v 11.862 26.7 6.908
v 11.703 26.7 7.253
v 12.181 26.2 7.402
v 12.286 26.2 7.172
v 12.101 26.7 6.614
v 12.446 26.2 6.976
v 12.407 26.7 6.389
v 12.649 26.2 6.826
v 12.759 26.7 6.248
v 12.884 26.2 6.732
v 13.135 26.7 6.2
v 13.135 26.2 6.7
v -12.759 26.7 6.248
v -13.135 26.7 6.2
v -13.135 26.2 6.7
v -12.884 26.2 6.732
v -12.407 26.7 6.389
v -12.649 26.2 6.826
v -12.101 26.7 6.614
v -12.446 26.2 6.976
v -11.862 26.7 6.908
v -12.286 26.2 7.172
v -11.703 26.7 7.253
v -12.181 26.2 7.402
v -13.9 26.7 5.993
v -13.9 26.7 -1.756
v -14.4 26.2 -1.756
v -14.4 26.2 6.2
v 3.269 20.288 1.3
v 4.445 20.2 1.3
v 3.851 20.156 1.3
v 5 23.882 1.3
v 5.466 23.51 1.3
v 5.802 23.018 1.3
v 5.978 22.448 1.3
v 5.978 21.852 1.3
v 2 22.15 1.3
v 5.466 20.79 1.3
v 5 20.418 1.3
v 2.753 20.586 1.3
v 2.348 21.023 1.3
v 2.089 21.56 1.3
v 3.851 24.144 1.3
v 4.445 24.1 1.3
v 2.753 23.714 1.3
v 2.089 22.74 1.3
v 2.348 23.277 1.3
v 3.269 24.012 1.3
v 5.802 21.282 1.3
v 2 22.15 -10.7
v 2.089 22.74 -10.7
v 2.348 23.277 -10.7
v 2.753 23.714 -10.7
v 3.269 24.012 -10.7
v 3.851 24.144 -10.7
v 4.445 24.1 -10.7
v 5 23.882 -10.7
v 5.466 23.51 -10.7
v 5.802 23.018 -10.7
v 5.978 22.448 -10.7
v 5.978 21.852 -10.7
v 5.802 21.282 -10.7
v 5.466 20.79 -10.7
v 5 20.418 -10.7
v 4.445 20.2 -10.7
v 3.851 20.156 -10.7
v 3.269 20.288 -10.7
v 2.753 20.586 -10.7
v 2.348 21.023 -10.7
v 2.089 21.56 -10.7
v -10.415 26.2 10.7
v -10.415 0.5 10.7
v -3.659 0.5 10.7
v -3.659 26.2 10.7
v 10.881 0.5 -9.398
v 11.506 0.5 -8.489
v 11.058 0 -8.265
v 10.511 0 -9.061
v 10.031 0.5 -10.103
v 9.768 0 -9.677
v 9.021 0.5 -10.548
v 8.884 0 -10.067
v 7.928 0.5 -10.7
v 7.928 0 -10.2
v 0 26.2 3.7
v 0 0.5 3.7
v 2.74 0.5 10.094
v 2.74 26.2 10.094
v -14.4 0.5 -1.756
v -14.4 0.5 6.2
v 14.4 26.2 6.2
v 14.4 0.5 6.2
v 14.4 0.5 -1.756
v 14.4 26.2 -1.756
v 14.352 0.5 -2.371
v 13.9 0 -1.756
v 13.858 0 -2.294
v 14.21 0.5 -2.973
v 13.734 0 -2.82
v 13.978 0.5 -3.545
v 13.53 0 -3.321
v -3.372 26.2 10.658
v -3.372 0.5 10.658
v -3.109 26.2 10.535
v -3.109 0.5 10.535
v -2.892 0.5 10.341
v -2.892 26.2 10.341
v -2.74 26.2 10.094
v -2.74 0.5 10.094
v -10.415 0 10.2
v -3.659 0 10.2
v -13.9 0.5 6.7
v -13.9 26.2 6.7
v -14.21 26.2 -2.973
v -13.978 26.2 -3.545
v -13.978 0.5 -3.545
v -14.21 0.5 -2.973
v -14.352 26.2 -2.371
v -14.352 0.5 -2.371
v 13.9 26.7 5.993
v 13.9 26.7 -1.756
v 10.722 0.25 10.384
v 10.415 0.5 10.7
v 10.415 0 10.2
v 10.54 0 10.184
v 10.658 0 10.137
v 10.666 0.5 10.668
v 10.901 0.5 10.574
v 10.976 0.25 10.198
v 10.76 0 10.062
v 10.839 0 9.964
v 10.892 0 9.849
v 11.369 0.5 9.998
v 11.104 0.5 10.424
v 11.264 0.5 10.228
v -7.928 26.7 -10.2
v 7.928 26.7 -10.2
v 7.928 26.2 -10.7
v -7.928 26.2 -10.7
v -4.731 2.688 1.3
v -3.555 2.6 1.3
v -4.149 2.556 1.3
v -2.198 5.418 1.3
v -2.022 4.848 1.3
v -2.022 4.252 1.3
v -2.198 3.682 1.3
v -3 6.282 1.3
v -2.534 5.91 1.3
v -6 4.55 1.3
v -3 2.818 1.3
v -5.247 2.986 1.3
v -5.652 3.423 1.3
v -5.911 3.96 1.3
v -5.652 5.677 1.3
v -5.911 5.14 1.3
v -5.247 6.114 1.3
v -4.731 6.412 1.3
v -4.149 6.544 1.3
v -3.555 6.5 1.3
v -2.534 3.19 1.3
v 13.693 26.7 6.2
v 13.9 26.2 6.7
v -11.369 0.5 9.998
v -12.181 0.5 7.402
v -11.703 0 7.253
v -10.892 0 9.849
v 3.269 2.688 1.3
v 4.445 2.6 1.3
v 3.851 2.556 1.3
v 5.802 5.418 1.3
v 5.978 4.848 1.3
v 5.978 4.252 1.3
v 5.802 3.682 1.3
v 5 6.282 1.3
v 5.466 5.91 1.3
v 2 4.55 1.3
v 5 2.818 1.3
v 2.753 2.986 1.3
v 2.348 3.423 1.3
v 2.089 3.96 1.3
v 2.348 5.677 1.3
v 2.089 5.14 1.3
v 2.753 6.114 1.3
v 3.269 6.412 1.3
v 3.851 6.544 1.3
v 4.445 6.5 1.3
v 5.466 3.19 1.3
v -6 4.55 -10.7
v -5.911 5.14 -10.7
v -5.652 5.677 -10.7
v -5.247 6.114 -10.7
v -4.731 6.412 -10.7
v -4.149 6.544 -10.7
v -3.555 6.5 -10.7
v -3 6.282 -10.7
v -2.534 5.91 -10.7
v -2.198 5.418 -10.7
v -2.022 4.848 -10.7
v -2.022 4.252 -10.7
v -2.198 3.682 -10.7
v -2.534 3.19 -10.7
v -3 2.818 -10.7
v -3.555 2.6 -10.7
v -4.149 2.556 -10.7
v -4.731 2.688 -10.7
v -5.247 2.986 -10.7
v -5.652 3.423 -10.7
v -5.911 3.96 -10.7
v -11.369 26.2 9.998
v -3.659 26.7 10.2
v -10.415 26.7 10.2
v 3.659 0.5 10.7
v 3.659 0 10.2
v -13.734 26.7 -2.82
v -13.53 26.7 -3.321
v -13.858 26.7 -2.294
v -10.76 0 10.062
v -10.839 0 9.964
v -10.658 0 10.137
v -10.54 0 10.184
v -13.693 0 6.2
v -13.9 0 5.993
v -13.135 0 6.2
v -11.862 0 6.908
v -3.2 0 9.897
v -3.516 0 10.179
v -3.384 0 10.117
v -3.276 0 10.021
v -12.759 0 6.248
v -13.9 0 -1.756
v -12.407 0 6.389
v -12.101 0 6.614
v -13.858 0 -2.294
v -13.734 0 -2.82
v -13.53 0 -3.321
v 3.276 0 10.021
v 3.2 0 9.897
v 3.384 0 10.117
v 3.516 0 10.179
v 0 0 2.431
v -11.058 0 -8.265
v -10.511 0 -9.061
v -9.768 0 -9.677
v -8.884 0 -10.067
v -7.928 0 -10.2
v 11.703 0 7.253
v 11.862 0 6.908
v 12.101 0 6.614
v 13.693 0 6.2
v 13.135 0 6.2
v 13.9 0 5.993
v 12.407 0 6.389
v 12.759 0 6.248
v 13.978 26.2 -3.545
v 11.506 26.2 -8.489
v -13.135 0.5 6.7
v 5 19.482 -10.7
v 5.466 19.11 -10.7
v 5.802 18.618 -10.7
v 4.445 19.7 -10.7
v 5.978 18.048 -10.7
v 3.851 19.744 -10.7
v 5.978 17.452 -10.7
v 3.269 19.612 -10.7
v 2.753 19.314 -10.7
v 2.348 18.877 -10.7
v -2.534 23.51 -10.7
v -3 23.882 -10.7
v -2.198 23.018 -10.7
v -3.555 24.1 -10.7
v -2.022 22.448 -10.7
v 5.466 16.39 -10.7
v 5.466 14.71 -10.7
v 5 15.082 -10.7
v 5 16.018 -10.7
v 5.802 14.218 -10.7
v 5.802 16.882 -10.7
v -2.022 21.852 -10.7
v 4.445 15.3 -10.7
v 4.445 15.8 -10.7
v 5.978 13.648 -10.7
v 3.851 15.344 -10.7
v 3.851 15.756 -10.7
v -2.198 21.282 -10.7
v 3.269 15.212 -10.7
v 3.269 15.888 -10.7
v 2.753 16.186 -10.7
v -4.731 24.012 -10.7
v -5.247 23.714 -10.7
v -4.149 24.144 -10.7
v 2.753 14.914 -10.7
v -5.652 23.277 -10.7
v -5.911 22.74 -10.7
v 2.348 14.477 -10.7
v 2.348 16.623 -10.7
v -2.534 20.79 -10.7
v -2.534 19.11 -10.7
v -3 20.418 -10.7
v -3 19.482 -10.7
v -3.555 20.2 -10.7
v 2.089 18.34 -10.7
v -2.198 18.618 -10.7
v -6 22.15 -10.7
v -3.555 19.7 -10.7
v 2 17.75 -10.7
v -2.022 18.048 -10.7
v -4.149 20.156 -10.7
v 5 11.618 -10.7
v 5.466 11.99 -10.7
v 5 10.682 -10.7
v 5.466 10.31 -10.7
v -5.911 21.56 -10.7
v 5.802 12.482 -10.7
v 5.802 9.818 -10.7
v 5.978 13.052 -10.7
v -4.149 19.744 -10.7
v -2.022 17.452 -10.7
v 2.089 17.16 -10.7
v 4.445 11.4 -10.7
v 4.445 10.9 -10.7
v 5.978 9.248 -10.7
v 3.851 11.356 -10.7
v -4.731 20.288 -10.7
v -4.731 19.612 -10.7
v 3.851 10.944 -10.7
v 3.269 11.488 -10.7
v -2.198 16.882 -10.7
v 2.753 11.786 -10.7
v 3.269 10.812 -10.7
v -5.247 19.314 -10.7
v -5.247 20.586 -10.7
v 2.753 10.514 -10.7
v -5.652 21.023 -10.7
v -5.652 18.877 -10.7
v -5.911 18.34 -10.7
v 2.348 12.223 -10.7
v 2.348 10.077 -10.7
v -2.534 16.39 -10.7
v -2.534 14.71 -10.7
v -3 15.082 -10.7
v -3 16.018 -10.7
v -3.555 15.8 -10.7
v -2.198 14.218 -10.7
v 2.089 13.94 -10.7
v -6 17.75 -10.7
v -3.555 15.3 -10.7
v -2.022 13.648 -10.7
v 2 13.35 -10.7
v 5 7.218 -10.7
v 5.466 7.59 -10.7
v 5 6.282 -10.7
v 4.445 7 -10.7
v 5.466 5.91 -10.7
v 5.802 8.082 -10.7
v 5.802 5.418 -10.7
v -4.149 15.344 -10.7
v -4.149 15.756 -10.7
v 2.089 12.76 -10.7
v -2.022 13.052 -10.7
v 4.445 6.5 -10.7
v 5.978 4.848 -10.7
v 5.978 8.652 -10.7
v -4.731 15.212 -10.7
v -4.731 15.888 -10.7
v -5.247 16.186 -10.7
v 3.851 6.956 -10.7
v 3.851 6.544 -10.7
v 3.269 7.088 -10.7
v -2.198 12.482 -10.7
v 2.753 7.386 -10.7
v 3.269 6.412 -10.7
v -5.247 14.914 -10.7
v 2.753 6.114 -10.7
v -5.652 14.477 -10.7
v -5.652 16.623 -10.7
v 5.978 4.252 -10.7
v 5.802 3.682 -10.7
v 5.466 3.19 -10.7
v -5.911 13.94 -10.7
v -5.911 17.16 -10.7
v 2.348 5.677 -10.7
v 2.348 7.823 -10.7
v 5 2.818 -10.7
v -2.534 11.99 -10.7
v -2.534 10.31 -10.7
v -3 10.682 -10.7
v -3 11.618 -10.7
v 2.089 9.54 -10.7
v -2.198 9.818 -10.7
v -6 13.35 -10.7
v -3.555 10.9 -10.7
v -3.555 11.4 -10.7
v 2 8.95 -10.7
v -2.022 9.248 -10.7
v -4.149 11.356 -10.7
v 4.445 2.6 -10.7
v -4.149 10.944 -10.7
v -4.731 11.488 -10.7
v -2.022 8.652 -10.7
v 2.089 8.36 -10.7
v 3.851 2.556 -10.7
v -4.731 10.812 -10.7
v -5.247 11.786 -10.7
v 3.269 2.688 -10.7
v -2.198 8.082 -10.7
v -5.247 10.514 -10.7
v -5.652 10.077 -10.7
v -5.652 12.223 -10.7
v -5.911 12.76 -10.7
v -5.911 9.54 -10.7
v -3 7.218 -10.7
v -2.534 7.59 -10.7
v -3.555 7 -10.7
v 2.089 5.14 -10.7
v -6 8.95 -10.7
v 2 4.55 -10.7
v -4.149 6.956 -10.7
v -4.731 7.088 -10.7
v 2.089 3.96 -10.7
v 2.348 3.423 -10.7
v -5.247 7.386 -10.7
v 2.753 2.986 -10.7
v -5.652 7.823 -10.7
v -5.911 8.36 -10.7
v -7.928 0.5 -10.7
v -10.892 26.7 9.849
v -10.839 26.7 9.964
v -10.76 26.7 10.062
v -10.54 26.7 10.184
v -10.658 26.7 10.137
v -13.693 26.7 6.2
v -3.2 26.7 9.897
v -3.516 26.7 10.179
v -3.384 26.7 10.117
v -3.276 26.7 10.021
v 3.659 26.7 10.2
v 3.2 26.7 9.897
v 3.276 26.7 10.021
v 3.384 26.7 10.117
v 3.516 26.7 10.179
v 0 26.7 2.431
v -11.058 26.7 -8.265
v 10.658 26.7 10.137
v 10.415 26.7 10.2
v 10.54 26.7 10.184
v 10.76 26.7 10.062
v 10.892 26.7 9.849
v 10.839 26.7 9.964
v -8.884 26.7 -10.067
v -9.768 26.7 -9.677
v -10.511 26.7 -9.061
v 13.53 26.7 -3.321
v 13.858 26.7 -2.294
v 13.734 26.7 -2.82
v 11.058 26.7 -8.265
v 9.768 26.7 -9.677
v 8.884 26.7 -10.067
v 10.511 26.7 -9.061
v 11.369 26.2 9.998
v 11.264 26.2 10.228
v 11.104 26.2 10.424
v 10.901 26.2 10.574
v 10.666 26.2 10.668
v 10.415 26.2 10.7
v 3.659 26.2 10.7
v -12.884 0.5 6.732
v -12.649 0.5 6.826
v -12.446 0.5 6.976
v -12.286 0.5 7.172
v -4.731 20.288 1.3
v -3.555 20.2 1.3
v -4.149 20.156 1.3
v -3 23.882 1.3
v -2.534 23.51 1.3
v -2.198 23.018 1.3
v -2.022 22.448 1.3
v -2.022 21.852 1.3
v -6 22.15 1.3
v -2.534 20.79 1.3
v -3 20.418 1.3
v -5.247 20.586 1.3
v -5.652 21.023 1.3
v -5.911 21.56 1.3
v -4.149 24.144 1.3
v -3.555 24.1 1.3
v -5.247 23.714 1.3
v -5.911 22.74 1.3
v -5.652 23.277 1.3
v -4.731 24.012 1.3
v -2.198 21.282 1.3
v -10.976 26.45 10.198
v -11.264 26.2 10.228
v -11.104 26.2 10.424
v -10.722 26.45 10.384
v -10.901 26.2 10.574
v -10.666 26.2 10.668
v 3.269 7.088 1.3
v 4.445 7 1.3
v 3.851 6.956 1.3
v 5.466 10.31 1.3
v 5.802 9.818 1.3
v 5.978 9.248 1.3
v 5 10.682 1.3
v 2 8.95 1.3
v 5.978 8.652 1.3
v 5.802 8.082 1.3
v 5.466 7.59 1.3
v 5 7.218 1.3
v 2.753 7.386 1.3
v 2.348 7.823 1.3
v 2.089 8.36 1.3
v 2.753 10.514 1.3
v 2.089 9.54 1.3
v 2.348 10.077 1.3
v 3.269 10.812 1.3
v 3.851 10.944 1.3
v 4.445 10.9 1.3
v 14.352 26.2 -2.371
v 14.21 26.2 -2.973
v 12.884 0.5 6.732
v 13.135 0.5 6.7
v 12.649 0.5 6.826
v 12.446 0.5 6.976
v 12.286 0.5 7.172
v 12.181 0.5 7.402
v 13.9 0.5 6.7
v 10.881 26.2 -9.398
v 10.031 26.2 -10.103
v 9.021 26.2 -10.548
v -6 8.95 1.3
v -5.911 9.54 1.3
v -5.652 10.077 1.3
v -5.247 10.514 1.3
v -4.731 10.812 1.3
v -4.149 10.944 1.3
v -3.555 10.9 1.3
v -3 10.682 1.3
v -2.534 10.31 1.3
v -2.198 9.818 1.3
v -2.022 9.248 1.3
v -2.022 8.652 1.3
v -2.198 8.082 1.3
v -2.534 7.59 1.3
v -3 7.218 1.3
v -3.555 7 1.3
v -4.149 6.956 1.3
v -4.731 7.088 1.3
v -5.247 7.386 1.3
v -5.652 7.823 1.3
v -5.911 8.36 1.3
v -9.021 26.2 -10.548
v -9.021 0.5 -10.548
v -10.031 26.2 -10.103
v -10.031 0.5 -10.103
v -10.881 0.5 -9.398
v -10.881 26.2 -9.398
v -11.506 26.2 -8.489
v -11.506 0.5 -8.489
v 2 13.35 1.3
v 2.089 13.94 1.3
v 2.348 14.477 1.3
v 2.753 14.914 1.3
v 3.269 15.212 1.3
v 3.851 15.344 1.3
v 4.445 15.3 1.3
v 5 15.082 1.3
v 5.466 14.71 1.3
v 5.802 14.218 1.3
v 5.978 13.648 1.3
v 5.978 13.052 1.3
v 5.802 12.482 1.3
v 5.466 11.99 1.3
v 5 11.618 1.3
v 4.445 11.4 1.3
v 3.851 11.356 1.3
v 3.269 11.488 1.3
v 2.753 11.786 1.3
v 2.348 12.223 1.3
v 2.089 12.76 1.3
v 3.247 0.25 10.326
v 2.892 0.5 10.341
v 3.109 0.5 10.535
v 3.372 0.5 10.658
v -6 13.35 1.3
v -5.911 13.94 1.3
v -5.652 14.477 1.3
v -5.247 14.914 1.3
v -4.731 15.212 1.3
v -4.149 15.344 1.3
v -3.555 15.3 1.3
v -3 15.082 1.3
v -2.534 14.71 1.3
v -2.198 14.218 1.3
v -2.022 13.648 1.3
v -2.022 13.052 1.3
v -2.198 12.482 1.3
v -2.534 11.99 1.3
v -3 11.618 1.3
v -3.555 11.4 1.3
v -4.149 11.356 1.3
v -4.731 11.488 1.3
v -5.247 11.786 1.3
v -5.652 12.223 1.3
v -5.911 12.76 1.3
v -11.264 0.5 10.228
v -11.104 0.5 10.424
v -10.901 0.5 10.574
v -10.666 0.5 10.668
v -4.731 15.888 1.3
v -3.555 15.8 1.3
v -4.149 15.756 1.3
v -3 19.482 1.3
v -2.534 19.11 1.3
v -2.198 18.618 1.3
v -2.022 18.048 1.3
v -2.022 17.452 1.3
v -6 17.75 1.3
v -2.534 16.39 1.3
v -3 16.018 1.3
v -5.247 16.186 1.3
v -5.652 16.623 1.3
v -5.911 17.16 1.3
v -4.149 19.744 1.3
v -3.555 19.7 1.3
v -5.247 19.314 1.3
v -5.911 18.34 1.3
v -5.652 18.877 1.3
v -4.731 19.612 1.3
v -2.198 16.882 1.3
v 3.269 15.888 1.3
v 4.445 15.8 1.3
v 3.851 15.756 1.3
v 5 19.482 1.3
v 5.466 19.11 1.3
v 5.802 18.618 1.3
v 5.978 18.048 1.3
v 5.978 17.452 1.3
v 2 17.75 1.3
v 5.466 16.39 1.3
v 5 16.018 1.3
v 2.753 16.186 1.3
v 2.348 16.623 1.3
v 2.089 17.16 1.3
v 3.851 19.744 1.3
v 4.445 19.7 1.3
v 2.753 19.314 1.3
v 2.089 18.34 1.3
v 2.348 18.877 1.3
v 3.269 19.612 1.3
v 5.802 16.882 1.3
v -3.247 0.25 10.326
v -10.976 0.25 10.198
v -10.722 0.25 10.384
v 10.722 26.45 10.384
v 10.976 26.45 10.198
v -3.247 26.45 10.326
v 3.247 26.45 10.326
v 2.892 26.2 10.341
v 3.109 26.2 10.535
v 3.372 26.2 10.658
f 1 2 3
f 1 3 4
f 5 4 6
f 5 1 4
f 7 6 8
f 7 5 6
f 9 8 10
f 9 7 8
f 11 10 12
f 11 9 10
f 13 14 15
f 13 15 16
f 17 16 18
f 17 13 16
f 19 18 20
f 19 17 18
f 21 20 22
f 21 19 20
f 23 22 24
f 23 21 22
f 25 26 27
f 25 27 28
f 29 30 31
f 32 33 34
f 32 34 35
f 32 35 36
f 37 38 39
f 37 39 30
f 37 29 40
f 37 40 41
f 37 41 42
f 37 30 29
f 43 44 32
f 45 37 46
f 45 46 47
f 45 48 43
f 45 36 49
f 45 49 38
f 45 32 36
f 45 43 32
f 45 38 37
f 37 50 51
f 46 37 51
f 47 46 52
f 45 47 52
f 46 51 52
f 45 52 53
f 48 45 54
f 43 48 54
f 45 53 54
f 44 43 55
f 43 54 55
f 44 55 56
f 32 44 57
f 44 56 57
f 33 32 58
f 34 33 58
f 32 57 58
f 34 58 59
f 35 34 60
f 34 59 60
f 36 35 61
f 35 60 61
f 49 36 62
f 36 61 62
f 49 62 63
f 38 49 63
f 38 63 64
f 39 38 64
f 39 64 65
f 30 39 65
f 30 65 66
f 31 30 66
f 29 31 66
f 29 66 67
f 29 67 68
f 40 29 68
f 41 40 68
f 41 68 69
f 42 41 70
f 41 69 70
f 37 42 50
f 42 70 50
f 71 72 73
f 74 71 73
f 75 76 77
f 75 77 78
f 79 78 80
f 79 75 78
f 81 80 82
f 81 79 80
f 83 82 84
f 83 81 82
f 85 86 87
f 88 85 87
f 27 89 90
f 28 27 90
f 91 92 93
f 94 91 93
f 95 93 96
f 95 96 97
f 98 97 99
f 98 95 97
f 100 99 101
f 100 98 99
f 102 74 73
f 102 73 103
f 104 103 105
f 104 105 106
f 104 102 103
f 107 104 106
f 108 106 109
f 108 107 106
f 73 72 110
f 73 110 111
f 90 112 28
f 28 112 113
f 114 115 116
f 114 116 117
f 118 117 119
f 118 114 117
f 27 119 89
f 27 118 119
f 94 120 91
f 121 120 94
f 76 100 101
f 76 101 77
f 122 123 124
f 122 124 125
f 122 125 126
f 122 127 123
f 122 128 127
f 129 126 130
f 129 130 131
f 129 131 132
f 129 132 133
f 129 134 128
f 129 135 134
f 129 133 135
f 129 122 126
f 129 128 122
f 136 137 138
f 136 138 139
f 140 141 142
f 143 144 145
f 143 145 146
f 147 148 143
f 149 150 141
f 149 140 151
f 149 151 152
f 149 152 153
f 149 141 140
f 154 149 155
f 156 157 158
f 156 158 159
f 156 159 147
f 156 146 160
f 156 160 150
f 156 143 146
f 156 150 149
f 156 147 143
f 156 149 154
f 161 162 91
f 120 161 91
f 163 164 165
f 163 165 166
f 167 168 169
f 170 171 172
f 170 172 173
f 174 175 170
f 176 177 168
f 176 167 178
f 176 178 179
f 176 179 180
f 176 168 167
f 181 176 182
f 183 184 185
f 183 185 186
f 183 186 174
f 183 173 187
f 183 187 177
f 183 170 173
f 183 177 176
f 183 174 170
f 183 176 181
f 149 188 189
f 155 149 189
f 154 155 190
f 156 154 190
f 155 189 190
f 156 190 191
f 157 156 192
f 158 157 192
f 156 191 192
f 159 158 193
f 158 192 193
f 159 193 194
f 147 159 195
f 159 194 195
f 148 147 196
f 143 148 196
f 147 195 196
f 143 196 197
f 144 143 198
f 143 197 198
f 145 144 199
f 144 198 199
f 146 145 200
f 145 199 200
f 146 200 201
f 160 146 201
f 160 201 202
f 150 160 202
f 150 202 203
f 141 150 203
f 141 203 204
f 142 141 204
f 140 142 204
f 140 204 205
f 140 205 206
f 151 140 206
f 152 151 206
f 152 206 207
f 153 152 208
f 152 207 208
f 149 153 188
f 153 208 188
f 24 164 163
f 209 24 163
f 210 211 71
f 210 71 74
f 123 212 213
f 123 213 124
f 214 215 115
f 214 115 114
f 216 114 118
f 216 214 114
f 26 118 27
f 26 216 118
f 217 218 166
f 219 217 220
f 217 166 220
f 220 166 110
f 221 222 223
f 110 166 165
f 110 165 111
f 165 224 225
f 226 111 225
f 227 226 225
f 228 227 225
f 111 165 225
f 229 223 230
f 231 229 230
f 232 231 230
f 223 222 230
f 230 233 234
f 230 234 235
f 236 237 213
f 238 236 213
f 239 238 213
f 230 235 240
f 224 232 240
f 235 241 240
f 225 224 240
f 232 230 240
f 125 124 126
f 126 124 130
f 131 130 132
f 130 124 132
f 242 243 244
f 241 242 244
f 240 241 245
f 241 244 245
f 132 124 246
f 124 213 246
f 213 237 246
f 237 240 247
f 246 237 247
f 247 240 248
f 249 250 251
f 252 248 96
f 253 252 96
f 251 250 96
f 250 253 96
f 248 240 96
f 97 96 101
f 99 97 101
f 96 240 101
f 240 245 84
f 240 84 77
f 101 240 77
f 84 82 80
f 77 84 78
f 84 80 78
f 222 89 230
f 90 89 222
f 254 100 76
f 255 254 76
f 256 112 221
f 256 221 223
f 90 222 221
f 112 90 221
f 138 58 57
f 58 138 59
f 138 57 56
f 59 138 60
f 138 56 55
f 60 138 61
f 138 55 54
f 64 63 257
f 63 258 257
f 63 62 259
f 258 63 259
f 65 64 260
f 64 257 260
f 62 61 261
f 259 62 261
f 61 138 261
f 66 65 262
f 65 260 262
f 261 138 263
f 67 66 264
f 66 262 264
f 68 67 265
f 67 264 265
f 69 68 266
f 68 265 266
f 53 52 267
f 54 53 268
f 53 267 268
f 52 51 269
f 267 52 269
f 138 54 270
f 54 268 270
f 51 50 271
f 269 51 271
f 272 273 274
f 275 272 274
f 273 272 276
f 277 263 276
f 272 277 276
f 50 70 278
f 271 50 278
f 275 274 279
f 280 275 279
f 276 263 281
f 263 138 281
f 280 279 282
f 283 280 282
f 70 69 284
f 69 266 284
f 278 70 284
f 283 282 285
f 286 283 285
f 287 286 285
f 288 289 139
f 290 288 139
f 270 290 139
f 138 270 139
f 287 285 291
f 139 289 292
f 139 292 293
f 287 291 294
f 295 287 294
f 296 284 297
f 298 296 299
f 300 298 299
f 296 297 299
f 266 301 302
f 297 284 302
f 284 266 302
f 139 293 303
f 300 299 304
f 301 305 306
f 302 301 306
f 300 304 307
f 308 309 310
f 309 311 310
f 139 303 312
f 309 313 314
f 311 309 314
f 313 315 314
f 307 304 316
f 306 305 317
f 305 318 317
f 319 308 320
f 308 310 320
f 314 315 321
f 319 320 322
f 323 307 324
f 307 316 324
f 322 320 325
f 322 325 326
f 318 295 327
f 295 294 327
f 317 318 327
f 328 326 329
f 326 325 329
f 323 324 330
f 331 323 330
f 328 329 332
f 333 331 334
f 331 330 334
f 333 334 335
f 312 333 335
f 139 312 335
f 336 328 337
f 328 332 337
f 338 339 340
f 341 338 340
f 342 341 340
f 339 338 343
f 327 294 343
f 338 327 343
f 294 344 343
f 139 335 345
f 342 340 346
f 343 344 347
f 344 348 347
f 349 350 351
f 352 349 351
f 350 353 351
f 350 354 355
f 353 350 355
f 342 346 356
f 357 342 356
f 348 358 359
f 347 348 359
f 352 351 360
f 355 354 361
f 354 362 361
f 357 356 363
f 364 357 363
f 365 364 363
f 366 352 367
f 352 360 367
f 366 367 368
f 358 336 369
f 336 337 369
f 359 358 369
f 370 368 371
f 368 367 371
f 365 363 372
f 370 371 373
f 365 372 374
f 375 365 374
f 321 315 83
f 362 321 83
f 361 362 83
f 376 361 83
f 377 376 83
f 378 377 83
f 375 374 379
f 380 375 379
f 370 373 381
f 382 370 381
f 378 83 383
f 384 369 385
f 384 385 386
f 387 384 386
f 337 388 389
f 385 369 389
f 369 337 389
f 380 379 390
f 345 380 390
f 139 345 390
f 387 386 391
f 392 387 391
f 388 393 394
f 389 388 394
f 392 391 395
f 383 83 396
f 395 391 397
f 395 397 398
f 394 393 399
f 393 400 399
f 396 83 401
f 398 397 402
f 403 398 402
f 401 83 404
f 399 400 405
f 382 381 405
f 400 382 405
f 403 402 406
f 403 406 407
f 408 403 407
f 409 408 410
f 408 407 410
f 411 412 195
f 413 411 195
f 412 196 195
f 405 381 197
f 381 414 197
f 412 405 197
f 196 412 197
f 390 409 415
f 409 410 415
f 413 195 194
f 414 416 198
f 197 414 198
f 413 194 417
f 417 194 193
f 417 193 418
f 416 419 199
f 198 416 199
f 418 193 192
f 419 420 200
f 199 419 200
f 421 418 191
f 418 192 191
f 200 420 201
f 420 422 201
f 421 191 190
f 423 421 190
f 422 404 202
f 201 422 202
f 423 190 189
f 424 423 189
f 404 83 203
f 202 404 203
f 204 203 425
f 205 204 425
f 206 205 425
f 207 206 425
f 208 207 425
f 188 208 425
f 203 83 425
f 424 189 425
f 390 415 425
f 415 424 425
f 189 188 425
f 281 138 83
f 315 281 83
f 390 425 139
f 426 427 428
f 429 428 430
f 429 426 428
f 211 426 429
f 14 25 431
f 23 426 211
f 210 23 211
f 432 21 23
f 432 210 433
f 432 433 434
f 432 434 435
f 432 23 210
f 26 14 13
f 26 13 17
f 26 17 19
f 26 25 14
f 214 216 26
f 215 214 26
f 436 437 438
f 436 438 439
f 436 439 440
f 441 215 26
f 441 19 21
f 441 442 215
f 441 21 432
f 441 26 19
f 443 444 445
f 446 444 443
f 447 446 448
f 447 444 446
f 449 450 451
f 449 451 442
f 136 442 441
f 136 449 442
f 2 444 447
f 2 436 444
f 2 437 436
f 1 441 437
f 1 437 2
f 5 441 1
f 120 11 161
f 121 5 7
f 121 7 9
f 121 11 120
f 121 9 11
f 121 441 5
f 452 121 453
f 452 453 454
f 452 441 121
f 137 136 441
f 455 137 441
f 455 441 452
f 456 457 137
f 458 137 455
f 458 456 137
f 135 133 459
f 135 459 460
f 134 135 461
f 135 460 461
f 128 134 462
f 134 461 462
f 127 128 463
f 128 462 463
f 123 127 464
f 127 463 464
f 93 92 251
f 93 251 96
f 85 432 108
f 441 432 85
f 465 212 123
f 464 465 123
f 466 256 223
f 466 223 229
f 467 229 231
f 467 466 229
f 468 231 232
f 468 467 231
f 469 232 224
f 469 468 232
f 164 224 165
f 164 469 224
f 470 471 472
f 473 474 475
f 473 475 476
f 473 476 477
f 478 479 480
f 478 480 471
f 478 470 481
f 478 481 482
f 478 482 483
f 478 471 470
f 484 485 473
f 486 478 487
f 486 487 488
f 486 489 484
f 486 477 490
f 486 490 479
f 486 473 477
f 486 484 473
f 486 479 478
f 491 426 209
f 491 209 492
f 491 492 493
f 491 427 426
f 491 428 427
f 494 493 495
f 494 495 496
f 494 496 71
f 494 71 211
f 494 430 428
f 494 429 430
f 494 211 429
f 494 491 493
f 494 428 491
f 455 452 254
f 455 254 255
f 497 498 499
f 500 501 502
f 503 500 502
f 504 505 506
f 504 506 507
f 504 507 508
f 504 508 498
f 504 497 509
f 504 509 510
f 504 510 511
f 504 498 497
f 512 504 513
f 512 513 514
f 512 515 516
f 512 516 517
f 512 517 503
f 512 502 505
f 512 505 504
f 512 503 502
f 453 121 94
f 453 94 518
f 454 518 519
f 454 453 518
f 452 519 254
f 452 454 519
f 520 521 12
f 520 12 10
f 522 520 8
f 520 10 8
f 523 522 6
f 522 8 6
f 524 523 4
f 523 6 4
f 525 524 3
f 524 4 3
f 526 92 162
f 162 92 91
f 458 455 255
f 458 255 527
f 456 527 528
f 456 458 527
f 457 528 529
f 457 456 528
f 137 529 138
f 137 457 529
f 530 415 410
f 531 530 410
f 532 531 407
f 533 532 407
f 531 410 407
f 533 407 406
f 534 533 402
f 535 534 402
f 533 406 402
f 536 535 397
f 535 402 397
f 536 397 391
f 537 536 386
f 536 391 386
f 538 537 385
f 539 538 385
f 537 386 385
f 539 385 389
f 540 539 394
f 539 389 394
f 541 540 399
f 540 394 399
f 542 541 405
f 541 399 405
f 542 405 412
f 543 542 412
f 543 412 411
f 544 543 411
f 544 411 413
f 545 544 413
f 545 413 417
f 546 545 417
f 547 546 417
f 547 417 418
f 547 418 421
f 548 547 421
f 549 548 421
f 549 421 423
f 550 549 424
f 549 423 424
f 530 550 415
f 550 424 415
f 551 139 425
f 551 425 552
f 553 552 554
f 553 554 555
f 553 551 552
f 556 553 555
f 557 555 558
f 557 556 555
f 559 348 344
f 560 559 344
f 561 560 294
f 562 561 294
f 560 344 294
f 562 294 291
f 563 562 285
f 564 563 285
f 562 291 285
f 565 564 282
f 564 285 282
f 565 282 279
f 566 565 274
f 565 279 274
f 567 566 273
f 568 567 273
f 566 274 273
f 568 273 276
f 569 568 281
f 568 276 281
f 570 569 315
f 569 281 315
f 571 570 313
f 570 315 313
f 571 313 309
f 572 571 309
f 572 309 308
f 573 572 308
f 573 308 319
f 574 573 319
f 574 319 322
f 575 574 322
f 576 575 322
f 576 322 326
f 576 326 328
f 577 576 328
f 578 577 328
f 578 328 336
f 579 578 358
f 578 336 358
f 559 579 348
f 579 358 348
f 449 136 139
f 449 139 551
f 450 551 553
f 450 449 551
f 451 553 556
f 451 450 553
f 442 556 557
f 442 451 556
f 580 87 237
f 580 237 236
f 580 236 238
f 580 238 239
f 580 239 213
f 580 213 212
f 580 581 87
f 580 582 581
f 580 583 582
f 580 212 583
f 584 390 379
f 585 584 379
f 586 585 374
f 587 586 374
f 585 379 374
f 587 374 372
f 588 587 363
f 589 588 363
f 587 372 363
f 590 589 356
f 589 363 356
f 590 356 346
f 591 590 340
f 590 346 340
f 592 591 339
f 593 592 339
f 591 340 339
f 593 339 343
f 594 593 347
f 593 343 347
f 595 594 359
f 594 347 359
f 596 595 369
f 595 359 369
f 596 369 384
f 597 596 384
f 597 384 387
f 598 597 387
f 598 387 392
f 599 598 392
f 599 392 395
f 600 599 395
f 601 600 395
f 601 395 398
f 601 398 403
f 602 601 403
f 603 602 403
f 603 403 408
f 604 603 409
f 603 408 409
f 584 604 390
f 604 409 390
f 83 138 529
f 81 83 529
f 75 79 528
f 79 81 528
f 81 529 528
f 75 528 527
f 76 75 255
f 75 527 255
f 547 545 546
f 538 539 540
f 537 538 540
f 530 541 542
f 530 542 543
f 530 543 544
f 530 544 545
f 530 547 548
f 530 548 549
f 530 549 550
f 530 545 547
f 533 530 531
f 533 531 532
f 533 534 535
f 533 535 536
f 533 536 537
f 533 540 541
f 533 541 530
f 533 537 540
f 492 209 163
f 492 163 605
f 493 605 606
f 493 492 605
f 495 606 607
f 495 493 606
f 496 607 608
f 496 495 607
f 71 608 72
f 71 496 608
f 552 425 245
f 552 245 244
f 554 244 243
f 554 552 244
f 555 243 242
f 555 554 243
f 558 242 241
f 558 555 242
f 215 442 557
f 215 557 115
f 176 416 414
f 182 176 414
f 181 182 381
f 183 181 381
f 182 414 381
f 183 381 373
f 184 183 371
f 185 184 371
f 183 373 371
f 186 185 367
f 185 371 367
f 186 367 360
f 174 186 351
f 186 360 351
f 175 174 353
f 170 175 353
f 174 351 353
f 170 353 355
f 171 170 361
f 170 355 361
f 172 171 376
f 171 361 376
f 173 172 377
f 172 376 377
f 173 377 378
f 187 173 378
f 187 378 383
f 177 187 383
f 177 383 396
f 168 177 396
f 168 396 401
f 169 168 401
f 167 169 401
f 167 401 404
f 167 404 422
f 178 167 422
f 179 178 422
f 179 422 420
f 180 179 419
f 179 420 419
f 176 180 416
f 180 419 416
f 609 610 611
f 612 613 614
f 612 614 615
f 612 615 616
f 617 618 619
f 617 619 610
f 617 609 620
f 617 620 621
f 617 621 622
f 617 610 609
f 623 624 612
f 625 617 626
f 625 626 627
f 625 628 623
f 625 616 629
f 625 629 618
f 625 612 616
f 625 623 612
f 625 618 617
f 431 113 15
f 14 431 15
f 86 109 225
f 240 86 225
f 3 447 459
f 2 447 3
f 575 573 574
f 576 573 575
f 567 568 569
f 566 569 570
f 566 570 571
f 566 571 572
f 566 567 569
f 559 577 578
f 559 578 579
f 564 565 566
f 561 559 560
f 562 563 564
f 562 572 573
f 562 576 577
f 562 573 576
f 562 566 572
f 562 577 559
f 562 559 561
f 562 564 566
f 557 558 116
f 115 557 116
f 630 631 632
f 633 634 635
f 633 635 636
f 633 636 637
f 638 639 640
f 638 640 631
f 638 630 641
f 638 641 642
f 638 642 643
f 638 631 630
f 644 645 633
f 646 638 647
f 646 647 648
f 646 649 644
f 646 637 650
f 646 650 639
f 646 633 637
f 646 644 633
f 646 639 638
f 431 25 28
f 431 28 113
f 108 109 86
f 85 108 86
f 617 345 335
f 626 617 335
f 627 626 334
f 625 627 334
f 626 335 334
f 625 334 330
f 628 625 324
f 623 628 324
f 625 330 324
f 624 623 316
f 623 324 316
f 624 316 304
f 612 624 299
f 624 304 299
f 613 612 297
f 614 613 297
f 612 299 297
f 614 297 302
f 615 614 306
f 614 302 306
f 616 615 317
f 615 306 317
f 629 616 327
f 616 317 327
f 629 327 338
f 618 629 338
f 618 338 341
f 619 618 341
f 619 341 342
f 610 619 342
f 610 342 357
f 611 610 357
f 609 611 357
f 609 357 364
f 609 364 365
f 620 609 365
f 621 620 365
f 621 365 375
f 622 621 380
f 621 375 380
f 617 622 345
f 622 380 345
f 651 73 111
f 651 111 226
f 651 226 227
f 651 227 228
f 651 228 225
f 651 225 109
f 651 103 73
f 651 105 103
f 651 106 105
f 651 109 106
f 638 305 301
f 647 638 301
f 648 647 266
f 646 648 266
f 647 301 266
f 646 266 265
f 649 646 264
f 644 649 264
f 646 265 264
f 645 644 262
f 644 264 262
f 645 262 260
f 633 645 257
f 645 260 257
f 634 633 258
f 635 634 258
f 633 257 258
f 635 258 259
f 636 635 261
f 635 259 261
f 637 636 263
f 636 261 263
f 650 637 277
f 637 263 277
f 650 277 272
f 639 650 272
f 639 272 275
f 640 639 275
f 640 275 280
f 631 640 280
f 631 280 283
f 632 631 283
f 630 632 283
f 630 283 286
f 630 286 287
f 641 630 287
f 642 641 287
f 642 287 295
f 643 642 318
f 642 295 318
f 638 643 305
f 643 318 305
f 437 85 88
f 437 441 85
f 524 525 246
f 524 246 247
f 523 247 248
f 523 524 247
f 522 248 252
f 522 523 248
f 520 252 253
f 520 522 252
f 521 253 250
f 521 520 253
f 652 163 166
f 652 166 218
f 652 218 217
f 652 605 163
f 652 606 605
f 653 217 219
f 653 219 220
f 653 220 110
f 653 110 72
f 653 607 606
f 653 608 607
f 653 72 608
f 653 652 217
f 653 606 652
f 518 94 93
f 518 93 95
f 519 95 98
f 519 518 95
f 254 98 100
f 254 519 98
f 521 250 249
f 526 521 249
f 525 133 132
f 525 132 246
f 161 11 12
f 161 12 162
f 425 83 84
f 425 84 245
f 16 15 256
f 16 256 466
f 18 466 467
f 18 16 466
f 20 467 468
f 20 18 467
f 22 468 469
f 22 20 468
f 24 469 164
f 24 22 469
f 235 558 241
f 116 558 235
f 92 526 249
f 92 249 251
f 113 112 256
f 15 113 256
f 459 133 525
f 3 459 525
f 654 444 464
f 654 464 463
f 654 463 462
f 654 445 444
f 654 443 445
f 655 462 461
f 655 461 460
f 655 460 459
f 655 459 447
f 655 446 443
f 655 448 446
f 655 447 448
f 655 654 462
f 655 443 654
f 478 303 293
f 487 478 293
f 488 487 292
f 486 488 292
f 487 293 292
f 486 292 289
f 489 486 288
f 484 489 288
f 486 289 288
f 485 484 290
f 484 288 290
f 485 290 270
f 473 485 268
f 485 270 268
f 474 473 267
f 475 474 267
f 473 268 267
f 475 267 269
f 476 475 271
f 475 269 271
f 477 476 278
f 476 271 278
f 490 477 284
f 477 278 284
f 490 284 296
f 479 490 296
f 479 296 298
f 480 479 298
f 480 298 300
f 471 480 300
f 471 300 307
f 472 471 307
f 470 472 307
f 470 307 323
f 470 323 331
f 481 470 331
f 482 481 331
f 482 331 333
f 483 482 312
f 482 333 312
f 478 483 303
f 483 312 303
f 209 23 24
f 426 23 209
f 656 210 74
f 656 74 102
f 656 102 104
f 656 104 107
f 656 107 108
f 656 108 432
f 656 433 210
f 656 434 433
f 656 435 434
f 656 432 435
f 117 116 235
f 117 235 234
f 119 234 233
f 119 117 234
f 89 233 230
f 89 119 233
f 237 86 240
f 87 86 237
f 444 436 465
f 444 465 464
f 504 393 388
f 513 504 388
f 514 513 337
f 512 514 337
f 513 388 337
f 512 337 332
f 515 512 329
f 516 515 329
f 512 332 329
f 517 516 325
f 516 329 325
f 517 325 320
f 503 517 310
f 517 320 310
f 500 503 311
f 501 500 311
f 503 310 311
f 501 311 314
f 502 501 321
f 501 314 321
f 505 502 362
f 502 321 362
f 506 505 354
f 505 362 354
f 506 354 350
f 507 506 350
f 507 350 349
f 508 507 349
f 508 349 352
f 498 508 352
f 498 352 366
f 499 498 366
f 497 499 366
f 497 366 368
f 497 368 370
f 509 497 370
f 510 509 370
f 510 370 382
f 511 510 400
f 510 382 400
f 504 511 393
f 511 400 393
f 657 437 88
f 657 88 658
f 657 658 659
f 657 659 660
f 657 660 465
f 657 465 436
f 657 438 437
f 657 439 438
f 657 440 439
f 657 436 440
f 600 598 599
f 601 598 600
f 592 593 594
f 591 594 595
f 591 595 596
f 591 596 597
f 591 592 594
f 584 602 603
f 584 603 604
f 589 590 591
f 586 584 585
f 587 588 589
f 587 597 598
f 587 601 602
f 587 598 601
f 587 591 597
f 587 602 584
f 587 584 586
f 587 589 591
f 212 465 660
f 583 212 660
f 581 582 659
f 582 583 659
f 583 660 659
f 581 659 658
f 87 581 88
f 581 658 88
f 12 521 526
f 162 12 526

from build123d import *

# Parameters (mm, degrees)
BOSS_EXTRUDE1_DEPTH = 26.7
FILLET1_R           = 4
FILLET2_R           = 1
CHAMFER1_SIZE       = 0.5
CHAMFER2_SIZE       = 0.5
SKETCH2_R           = 2
CUT_EXTRUDE1_DEPTH  = 12


with BuildPart() as part:
    # Sketch1 → Boss-Extrude1 (new body)
    with BuildSketch(Plane(origin=(0, 0, 0), x_dir=(1, 0, 0), z_dir=(0, 1, 0))):
        Polygon((10.4, 10.7), (-10.4, 10.7), (-14.4, 2.7), (-14.4, -6.7), (-12.4, -6.7), (-11.15, -10.7), (-3, -10.7), (0, -3.7), (3, -10.7), (11.15, -10.7), (12.4, -6.7), (14.4, -6.7), (14.4, 2.7), align=None)
    extrude(amount=BOSS_EXTRUDE1_DEPTH)

    # Fillet1
    fillet1_edges = [part.edges().sort_by_distance(p)[0] for p in [
        (-14.4, 13.35, -2.7),
        (-10.4, 13.35, -10.7),
        (10.4, 13.35, -10.7),
        (14.4, 13.35, -2.7),
    ]]
    fillet(fillet1_edges, radius=FILLET1_R)

    # Fillet2
    fillet2_edges = [part.edges().sort_by_distance(p)[0] for p in [
        (-3, 13.35, 10.7),
        (-11.15, 13.35, 10.7),
        (-12.4, 13.35, 6.7),
        (12.4, 13.35, 6.7),
        (11.15, 13.35, 10.7),
        (3, 13.35, 10.7),
    ]]
    fillet(fillet2_edges, radius=FILLET2_R)

    # Chamfer1
    chamfer1_edges = [part.edges().sort_by_distance(p)[0] for p in [
        (-14.4, 13.35, 6.7),
        (14.4, 13.35, 6.7),
    ]]
    chamfer(chamfer1_edges, length=CHAMFER1_SIZE)

    # Chamfer2
    chamfer2_edges = [part.edges().sort_by_distance(p)[0] for p in [
        (-13.517595457, 0, 6.7),
        (-13.517595457, 26.7, 6.7),
        (-14.4, 0, 2.222135955),
        (1.370125564, 26.7, 6.896959649),
        (14.4, 0, 2.222135955),
        (13.517595457, 0, 6.7),
        (14.15, 0, 6.45),
        (-14.15, 0, 6.45),
        (-14.4, 26.7, 2.222135955),
        (13.517595457, 26.7, 6.7),
        (14.4, 26.7, 2.222135955),
        (14.15, 26.7, 6.45),
        (-14.15, 26.7, 6.45),
        (1.370125564, 0, 6.896959649),
        (-12.741640786, 0, -6.016718427),
        (0, 0, -10.7),
        (12.741640786, 0, -6.016718427),
        (-10.030788493, 0, -10.102603233),
        (10.030788493, 0, -10.102603233),
        (14.292995958, 0, -2.674739772),
        (-14.292995958, 0, -2.674739772),
        (-12.741640786, 26.7, -6.016718427),
        (12.741640786, 26.7, -6.016718427),
        (0, 26.7, -10.7),
        (-10.030788493, 26.7, -10.102603233),
        (10.030788493, 26.7, -10.102603233),
        (14.292995958, 26.7, -2.674739772),
        (-14.292995958, 26.7, -2.674739772),
        (-1.370125564, 0, 6.896959649),
        (-1.370125564, 26.7, 6.896959649),
        (11.775, 0, 8.7),
        (7.037102622, 0, 10.7),
        (-7.037102622, 0, 10.7),
        (-11.775, 0, 8.7),
        (-11.007145565, 0, 10.505690695),
        (11.007145565, 0, 10.505690695),
        (3.108905149, 0, 10.534841092),
        (-3.108905149, 0, 10.534841092),
        (-7.037102622, 26.7, 10.7),
        (-11.775, 26.7, 8.7),
        (7.037102622, 26.7, 10.7),
        (11.775, 26.7, 8.7),
        (-11.007145565, 26.7, 10.505690695),
        (11.007145565, 26.7, 10.505690695),
        (3.108905149, 26.7, 10.534841092),
        (-3.108905149, 26.7, 10.534841092),
        (12.542854435, 0, 6.894309305),
        (12.542854435, 26.7, 6.894309305),
        (-12.542854435, 0, 6.894309305),
        (-12.542854435, 26.7, 6.894309305),
    ]]
    chamfer(chamfer2_edges, length=CHAMFER2_SIZE)

    # Sketch2 → Cut-Extrude1 (cut)
    with BuildSketch(Plane(origin=(0, 0, -10.7), x_dir=(-1, 0, 0), z_dir=(0, 0, -1))):
        with Locations((-4, 22.15)):
            Circle(SKETCH2_R)
        with Locations((4, 22.15)):
            Circle(SKETCH2_R)
        with Locations((-4, 17.75)):
            Circle(SKETCH2_R)
        with Locations((4, 17.75)):
            Circle(SKETCH2_R)
        with Locations((-4, 13.35)):
            Circle(SKETCH2_R)
        with Locations((4, 13.35)):
            Circle(SKETCH2_R)
        with Locations((-4, 8.95)):
            Circle(SKETCH2_R)
        with Locations((4, 8.95)):
            Circle(SKETCH2_R)
        with Locations((-4, 4.55)):
            Circle(SKETCH2_R)
        with Locations((4, 4.55)):
            Circle(SKETCH2_R)
    extrude(amount=-CUT_EXTRUDE1_DEPTH, mode=Mode.SUBTRACT)


solid = part.part
